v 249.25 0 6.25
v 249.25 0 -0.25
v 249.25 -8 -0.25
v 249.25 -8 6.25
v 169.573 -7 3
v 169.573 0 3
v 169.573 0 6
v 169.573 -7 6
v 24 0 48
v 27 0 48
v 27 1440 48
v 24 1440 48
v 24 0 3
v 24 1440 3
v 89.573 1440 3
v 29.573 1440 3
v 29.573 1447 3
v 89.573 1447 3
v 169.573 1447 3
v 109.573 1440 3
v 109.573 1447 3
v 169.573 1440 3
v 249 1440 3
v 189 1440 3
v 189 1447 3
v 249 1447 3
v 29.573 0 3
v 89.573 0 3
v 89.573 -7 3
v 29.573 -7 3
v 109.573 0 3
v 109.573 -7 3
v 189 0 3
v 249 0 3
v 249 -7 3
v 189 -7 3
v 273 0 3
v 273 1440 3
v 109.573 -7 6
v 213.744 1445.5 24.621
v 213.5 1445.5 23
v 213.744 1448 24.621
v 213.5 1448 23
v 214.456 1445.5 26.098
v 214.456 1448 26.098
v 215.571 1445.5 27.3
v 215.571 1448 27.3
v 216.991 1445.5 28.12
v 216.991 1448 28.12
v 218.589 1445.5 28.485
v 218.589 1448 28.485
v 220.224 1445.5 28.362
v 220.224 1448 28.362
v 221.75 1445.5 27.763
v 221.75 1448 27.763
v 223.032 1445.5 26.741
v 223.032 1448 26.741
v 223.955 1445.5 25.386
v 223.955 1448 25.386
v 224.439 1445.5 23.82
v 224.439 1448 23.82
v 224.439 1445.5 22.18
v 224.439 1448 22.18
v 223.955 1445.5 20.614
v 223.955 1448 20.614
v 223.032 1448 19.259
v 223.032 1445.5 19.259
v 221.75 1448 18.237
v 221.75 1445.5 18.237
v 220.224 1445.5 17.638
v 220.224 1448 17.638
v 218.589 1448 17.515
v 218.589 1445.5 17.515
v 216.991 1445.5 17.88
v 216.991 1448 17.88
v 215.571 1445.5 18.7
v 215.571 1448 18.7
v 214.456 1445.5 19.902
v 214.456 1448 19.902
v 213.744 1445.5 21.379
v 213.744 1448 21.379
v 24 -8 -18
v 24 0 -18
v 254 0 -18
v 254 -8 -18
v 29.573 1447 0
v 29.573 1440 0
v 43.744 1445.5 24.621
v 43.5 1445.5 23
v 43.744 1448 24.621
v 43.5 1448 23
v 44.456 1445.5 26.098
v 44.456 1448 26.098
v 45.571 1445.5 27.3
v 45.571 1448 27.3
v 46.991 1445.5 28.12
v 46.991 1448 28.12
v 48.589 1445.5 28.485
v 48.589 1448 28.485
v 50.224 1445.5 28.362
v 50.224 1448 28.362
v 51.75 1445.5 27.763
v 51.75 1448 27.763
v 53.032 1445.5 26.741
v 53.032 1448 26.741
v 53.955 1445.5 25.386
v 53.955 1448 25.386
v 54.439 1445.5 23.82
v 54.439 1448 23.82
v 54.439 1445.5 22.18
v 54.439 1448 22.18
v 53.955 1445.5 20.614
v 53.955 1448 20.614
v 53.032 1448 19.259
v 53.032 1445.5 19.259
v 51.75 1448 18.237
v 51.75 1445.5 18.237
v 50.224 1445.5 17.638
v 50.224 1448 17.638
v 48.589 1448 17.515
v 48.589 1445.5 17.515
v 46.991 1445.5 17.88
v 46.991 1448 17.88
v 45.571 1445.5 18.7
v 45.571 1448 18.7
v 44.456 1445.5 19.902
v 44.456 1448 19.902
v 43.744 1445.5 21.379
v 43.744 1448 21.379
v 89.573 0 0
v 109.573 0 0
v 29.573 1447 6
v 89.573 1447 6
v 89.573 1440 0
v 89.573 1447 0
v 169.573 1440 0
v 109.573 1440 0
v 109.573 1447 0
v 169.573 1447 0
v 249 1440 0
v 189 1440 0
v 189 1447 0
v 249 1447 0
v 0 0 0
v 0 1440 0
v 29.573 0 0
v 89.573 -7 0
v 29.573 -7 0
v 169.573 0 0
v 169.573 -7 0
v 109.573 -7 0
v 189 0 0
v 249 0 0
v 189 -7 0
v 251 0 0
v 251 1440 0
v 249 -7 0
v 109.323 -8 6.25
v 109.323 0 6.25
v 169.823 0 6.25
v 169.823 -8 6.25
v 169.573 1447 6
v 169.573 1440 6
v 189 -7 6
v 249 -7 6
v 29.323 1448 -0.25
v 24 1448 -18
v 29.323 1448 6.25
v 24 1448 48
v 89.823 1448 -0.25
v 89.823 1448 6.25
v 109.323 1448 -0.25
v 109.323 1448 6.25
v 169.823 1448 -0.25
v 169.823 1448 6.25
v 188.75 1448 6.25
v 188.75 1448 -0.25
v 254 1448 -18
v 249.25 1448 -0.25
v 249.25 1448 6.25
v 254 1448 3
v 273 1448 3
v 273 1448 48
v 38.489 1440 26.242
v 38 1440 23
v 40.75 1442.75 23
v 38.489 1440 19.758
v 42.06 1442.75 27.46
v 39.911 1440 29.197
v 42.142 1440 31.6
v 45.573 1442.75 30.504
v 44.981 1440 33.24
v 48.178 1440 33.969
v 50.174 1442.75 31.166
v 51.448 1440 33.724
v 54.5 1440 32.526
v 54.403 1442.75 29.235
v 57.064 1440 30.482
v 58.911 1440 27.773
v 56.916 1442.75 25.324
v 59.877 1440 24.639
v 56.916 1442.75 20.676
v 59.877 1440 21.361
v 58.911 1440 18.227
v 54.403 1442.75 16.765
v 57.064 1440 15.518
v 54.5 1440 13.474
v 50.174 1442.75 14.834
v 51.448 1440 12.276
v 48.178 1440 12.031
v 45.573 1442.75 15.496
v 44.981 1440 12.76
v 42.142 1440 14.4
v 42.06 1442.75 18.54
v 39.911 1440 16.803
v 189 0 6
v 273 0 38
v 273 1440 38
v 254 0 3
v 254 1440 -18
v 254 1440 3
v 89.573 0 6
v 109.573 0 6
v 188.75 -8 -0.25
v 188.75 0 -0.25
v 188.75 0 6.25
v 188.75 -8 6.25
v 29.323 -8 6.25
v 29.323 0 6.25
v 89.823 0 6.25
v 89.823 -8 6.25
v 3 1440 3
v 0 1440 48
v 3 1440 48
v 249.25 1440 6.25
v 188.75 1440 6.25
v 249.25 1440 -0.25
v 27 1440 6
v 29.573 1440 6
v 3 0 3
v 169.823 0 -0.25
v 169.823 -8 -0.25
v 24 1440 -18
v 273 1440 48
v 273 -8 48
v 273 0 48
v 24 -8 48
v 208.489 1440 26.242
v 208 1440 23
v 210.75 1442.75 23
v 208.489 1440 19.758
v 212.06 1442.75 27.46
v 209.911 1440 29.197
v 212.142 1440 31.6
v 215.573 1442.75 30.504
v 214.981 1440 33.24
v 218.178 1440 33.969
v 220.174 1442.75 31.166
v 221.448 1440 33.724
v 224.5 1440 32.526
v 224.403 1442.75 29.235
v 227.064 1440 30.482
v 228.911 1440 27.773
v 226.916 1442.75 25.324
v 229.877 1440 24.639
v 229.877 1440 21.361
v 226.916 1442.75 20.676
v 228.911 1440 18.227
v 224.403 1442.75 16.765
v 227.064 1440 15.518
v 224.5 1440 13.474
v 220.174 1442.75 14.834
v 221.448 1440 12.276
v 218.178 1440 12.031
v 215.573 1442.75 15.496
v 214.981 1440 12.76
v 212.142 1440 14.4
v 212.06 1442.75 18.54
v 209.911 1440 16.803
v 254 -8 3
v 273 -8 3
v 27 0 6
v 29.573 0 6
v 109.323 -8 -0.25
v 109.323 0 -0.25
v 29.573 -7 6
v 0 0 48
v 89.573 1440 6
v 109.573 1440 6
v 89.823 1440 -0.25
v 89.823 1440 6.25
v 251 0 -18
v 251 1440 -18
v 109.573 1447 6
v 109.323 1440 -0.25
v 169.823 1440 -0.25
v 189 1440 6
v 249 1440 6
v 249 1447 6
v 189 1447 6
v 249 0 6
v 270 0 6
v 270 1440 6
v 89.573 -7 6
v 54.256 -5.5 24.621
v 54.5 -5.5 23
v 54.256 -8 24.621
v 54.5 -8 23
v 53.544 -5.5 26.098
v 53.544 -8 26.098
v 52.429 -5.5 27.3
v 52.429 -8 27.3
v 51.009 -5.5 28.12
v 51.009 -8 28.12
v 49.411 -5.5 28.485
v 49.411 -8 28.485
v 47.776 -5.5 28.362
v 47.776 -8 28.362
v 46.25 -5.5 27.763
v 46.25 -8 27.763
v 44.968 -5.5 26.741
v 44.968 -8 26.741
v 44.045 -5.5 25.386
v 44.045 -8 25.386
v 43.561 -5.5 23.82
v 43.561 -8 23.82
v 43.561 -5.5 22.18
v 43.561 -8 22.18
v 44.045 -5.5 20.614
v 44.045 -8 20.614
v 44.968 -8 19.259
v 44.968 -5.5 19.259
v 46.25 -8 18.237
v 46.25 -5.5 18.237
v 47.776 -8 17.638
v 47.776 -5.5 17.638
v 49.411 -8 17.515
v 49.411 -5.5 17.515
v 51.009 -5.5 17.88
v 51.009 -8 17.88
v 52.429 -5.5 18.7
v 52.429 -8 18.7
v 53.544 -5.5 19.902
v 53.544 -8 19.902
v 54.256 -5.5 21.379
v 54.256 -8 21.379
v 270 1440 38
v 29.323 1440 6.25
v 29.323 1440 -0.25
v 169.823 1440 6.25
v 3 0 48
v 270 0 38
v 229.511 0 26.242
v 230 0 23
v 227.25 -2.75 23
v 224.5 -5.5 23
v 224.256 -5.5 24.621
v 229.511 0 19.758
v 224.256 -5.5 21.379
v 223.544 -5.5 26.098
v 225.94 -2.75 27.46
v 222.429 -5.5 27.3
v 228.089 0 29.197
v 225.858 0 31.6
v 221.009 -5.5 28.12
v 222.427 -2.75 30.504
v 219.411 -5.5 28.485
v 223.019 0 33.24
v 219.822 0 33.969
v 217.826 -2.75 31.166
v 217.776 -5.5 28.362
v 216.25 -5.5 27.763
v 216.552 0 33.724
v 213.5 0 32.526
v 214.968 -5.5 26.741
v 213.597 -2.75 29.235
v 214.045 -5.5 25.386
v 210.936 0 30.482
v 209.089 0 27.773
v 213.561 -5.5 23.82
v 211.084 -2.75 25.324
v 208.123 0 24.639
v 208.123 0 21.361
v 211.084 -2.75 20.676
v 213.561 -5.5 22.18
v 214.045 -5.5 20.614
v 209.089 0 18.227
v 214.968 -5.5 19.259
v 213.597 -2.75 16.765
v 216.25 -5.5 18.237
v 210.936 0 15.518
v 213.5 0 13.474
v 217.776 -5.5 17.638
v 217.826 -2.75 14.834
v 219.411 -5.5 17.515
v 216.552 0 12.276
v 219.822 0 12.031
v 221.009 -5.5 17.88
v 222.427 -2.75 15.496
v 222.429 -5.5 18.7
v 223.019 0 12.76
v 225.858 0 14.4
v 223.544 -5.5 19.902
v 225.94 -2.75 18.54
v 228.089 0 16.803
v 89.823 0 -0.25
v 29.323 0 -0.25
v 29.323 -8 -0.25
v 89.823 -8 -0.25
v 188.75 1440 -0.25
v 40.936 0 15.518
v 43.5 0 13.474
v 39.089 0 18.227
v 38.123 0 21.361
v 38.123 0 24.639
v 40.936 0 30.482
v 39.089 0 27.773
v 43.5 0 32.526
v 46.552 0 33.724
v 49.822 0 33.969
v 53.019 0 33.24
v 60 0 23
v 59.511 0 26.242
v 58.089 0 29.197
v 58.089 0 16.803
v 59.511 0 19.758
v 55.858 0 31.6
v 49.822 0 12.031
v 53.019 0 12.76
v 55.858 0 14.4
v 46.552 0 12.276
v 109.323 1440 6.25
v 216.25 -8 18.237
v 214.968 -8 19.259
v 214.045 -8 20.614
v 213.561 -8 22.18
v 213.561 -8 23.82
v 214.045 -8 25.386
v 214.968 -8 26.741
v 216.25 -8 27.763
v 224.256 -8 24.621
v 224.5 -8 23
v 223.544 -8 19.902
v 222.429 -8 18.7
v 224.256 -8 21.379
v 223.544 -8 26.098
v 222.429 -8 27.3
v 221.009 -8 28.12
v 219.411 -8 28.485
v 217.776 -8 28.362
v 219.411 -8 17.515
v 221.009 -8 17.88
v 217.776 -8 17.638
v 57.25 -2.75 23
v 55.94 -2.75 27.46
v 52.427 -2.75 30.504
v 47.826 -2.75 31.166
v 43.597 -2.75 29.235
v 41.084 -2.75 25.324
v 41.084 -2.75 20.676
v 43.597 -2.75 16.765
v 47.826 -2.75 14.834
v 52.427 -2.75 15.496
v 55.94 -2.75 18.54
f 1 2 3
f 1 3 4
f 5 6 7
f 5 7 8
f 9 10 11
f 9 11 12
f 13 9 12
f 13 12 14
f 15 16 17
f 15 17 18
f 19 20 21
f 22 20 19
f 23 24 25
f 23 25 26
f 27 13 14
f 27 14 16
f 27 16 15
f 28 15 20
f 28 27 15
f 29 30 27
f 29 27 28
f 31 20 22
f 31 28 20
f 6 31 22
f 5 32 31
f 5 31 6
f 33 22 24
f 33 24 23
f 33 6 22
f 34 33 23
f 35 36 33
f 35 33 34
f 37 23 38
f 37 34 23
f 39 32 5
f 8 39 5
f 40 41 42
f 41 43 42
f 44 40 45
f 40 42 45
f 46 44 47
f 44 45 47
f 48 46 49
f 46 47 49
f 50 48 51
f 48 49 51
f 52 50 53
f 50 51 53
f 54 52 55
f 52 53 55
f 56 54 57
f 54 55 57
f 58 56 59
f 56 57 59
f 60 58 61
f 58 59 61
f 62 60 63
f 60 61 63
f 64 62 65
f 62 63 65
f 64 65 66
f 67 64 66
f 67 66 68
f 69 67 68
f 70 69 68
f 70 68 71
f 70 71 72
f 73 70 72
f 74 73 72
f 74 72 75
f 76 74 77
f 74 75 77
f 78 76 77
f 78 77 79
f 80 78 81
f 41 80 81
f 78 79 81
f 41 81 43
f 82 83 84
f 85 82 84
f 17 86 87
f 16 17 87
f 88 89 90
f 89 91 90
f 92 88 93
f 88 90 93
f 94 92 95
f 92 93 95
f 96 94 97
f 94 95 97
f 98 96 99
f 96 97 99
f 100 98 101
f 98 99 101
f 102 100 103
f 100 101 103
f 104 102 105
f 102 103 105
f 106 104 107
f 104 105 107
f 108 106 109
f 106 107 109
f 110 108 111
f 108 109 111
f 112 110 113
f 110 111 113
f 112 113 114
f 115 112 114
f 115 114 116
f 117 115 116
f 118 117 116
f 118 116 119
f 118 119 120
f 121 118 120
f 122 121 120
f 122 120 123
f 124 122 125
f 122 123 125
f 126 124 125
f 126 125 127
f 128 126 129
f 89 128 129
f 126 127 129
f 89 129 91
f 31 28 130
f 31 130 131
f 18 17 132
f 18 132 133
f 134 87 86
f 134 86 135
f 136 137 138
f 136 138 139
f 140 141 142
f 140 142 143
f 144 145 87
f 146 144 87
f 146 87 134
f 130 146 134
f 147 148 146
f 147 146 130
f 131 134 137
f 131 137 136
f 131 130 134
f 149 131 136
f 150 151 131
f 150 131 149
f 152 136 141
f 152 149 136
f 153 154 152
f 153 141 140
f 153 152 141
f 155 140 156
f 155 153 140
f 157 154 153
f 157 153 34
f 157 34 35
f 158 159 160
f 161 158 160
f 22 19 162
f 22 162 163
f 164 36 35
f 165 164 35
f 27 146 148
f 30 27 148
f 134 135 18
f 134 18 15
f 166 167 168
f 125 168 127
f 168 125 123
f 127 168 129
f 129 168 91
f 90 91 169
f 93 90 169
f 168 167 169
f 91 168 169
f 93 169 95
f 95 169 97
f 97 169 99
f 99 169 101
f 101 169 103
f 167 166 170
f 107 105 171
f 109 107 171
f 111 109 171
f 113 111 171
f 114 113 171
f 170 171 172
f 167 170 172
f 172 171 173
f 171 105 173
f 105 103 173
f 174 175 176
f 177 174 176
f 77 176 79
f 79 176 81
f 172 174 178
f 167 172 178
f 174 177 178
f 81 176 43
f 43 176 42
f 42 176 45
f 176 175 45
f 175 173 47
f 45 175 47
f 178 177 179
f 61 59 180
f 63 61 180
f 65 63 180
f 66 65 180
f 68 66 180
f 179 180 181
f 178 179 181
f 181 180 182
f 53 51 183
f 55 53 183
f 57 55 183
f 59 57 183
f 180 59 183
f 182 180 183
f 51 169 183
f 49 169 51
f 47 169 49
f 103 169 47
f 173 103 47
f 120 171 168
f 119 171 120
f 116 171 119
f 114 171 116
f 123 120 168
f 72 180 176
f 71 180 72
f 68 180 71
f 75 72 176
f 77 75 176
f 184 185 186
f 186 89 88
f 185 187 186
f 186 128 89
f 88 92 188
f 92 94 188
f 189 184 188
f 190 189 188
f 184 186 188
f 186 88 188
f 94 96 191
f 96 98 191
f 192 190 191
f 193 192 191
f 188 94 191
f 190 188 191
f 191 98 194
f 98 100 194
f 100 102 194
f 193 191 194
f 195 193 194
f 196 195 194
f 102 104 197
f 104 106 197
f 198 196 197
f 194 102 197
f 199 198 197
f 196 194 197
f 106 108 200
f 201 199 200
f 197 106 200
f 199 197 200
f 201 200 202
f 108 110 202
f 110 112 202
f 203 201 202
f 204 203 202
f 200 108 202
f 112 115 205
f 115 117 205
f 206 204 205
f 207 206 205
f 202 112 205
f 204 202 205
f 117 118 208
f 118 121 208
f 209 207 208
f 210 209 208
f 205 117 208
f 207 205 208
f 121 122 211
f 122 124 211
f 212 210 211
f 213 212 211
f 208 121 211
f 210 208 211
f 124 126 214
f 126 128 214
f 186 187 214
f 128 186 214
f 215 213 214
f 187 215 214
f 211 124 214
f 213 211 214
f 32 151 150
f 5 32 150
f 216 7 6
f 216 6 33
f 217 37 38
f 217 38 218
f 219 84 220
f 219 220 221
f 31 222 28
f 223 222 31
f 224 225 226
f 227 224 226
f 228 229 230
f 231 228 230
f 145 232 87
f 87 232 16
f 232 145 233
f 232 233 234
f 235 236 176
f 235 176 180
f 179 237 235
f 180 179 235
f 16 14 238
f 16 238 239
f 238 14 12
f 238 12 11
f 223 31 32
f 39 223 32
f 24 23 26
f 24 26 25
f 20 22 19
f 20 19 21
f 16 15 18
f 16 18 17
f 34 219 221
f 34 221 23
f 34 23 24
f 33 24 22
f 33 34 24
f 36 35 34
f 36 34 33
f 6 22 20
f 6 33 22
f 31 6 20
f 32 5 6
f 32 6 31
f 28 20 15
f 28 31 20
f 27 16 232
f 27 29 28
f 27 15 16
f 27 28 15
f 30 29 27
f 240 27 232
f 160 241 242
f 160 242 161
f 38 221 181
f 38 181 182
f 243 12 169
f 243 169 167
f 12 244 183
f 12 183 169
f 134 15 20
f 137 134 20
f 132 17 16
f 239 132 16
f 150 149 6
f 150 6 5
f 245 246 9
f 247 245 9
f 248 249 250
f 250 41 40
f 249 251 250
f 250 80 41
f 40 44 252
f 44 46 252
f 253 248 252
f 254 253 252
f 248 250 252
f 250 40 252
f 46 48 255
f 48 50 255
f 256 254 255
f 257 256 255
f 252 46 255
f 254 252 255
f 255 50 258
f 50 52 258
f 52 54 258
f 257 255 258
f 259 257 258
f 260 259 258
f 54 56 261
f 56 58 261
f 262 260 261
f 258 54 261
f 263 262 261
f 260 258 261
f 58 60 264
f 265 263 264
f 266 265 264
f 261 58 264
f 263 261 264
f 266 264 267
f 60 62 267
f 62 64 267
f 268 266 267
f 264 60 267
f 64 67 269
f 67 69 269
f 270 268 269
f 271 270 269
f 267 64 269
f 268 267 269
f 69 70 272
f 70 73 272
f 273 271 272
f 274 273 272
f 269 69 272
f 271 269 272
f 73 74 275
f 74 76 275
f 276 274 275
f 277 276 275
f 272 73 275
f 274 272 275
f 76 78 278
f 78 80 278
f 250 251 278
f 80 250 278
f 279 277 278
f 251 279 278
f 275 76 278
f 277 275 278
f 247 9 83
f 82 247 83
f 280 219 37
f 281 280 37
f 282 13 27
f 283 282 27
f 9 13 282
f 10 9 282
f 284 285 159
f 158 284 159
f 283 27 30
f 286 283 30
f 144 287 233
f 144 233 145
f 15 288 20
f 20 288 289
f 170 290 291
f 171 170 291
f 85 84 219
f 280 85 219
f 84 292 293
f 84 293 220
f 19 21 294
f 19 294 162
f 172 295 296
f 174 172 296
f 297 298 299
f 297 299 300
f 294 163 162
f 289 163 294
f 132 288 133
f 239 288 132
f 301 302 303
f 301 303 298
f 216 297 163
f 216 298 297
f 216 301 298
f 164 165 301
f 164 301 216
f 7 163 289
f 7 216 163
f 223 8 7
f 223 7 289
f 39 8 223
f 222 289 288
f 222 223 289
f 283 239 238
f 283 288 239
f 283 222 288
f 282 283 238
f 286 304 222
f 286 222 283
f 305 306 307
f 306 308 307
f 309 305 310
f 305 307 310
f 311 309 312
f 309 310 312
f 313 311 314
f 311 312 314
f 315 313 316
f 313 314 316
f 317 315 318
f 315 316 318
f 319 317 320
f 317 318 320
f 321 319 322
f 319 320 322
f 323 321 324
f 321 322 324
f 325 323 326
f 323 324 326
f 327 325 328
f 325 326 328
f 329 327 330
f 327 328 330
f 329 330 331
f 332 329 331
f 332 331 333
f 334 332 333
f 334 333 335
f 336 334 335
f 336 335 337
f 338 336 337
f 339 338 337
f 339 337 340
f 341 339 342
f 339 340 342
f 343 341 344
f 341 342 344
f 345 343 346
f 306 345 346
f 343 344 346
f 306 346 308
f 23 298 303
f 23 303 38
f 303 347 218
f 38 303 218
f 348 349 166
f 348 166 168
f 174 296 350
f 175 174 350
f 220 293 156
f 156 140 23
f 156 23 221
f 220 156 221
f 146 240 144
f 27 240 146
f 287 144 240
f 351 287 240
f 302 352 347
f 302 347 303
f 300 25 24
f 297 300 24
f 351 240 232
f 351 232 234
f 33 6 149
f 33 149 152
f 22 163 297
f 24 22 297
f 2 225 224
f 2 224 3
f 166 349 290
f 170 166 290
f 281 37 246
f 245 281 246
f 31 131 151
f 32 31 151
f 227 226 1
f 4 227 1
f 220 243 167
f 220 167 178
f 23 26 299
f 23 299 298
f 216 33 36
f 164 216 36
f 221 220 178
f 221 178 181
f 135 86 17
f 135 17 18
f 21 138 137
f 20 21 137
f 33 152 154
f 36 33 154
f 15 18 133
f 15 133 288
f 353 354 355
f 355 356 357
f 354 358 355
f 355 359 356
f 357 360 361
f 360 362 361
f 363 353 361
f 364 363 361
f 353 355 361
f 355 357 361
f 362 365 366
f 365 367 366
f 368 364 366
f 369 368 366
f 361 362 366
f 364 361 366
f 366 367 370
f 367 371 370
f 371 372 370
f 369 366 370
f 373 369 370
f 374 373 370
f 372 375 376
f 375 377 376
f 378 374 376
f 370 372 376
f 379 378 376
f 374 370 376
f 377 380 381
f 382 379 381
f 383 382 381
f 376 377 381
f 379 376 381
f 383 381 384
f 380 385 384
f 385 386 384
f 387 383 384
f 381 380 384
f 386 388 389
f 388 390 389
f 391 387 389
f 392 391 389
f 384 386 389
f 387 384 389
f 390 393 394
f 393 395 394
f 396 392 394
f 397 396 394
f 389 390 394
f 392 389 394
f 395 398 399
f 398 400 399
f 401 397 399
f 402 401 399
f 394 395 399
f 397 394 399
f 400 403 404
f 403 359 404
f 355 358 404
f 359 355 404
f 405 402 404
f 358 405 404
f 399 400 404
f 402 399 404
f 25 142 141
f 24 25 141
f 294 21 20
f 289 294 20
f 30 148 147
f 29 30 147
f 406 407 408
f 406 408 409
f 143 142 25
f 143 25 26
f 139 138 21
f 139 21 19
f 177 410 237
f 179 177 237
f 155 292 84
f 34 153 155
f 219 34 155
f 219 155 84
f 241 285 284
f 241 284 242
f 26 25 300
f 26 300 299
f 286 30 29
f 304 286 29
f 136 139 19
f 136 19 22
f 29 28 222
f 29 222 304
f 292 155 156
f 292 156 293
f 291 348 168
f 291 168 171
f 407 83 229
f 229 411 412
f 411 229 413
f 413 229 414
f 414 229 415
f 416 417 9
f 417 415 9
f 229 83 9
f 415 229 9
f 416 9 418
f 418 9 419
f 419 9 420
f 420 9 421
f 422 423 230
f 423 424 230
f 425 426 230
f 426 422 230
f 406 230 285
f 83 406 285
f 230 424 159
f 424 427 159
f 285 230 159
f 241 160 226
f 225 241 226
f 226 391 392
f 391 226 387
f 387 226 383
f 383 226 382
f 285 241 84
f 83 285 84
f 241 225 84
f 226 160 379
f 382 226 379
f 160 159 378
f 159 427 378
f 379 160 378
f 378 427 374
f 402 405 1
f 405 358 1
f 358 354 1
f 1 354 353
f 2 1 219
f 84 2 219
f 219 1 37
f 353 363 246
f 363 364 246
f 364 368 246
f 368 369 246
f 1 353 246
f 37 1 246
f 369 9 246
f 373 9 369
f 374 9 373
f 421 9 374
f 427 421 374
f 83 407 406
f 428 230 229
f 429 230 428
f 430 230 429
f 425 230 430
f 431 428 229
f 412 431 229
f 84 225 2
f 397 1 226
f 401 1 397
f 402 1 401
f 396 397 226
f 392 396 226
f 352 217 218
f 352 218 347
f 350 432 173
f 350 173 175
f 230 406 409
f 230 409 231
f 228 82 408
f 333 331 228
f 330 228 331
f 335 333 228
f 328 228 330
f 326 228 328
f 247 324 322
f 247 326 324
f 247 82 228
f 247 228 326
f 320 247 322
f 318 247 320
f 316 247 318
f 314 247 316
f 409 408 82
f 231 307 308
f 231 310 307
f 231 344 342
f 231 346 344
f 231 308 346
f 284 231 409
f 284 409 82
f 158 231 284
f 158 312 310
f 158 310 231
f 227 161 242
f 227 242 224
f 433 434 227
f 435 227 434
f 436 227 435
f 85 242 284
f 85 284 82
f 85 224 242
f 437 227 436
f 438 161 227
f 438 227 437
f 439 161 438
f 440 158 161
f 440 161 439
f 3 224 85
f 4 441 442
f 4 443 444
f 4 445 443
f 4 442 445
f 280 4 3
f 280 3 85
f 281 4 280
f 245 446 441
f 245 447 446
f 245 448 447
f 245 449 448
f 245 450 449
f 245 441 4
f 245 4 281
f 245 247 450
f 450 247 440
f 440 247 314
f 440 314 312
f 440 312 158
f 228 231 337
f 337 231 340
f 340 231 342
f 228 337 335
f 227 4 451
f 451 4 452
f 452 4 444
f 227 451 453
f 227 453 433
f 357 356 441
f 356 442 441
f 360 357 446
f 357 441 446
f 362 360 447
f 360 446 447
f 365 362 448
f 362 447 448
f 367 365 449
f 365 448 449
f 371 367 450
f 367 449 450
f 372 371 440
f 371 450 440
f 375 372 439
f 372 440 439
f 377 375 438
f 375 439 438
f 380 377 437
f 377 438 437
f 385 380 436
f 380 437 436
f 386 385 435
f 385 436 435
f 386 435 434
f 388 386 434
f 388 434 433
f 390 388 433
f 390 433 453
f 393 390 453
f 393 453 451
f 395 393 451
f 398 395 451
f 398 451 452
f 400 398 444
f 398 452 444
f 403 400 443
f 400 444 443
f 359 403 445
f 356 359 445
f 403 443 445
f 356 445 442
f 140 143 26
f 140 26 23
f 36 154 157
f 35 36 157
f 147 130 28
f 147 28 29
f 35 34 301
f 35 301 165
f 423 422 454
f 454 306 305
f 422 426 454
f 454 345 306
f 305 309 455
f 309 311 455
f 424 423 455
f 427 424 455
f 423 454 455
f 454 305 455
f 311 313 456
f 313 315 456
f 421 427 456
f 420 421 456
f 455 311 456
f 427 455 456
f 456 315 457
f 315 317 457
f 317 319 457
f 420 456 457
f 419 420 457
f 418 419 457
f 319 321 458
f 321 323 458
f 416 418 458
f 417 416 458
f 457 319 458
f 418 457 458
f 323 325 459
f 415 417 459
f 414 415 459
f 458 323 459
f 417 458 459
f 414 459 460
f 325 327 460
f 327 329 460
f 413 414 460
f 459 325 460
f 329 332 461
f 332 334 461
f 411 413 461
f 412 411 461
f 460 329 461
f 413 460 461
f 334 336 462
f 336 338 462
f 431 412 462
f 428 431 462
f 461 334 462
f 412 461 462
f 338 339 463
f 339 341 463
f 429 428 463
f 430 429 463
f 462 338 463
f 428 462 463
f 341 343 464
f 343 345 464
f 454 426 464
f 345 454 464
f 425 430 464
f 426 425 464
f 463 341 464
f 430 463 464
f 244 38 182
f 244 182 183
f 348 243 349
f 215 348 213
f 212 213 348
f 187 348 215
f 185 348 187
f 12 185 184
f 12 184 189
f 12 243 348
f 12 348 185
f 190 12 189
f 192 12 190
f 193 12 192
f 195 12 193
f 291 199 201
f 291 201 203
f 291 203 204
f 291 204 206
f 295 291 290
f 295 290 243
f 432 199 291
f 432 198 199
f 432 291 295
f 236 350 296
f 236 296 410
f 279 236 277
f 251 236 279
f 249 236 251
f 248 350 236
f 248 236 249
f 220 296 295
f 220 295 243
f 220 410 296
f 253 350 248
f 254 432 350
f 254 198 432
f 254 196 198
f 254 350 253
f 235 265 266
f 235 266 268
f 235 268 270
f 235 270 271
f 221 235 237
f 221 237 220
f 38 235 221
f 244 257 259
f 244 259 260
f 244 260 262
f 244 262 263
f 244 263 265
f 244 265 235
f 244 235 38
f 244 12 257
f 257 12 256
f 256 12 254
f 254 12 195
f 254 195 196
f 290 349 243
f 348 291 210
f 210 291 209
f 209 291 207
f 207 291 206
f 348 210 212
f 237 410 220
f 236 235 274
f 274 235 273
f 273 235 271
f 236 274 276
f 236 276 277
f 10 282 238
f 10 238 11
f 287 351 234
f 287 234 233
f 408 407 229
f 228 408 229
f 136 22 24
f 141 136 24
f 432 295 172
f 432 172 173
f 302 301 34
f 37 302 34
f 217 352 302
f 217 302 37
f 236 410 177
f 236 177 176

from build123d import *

# Parameters (mm, degrees)
F1_DEPTH        = 1440
F2_DEPTH        = 1440
F3_W            = 60
F3_H            = 7
F4_DEPTH        = 3
F6_W            = 60
F6_H            = 7
F7_DEPTH        = 3
F8_W            = 60.5
F8_H            = 6.5
F9_DEPTH        = 8
F12_D           = 11
F12_CSINK_D     = 22
F12_CSINK_ANGLE = 90
F14_D           = 11
F14_CSINK_D     = 22
F14_CSINK_ANGLE = 90


with BuildPart() as f1:
    # F0 (on Front) → F1 (new body)
    with BuildSketch(Plane.XZ):
        Polygon((3, 48), (0, 48), (0, 0), (251, 0), (251, -18), (254, -18), (254, 3), (24, 3), (3, 3), align=None)
    extrude(amount=-F1_DEPTH)

    # F6 (on face) → F7 (join)
    with BuildSketch(Plane(origin=(0, 0, 0), x_dir=(1, 0, 0), z_dir=(0, 0, -1))):
        with Locations((219, 3.5)):
            Rectangle(F6_W, F6_H)
        with Locations((139.5732760429, 3.5)):
            Rectangle(F6_W, F6_H)
        with Locations((59.5732760429, 3.5)):
            Rectangle(F6_W, F6_H)
        with Locations((219, -1443.5)):
            Rectangle(F6_W, F6_H)
        with Locations((59.5732760429, -1443.5)):
            Rectangle(F6_W, F6_H)
        with Locations((139.5732760429, -1443.5)):
            Rectangle(F6_W, F6_H)
    extrude(amount=-F7_DEPTH)


with BuildPart() as f2:
    # F0 (on Front) → F2 (new body)
    with BuildSketch(Plane.XZ):
        Polygon((24, 48), (24, 3), (254, 3), (273, 3), (273, 6), (273, 38), (270, 38), (270, 6), (27, 6), (27, 48), align=None)
    extrude(amount=-F2_DEPTH)

    # F3 (on face) → F4 (join)
    with BuildSketch(Plane(origin=(0, 0, 3), x_dir=(1, 0, 0), z_dir=(0, 0, -1))):
        with Locations((59.5732760429, 3.5)):
            Rectangle(F3_W, F3_H)
        with Locations((139.5732760429, 3.5)):
            Rectangle(F3_W, F3_H)
        with Locations((219, 3.5)):
            Rectangle(F3_W, F3_H)
        with Locations((219, -1443.5)):
            Rectangle(F3_W, F3_H)
        with Locations((59.5732760429, -1443.5)):
            Rectangle(F3_W, F3_H)
        with Locations((139.5732760429, -1443.5)):
            Rectangle(F3_W, F3_H)
    extrude(amount=-F4_DEPTH)


with BuildPart() as f9:
    # F8 (on face) → F9 (new body)
    with BuildSketch(Plane.XZ):
        Polygon((254, 3), (273, 3), (273, 48), (24, 48), (24, -18), (254, -18), align=None)
        with Locations((59.5732760429, 3)):
            Rectangle(F8_W, F8_H, mode=Mode.SUBTRACT)
        with Locations((139.5732760429, 3)):
            Rectangle(F8_W, F8_H, mode=Mode.SUBTRACT)
        with Locations((219, 3)):
            Rectangle(F8_W, F8_H, mode=Mode.SUBTRACT)
    extrude(amount=F9_DEPTH)


with BuildPart() as f10_1:
    # F10: instance of F9
    add(f9.part.mirror(Plane.XZ.offset(-720)))

    # F14 (through all)
    with Locations(Plane.XZ.offset(-1440)):
        with Locations((49, 23), (219, 23)):
            CounterSinkHole(F14_D / 2, F14_CSINK_D / 2, counter_sink_angle=F14_CSINK_ANGLE)


with BuildPart() as f9_1:
    add(f9.part)

    # F12 (through all)
    with Locations(Plane(origin=(0, 0, 0), x_dir=(-1, 0, 0), z_dir=(0, 1, 0))):
        with Locations((-49, 23), (-219, 23)):
            CounterSinkHole(F12_D / 2, F12_CSINK_D / 2, counter_sink_angle=F12_CSINK_ANGLE)


solid = Compound([f1.part, f2.part, f10_1.part, f9_1.part])
